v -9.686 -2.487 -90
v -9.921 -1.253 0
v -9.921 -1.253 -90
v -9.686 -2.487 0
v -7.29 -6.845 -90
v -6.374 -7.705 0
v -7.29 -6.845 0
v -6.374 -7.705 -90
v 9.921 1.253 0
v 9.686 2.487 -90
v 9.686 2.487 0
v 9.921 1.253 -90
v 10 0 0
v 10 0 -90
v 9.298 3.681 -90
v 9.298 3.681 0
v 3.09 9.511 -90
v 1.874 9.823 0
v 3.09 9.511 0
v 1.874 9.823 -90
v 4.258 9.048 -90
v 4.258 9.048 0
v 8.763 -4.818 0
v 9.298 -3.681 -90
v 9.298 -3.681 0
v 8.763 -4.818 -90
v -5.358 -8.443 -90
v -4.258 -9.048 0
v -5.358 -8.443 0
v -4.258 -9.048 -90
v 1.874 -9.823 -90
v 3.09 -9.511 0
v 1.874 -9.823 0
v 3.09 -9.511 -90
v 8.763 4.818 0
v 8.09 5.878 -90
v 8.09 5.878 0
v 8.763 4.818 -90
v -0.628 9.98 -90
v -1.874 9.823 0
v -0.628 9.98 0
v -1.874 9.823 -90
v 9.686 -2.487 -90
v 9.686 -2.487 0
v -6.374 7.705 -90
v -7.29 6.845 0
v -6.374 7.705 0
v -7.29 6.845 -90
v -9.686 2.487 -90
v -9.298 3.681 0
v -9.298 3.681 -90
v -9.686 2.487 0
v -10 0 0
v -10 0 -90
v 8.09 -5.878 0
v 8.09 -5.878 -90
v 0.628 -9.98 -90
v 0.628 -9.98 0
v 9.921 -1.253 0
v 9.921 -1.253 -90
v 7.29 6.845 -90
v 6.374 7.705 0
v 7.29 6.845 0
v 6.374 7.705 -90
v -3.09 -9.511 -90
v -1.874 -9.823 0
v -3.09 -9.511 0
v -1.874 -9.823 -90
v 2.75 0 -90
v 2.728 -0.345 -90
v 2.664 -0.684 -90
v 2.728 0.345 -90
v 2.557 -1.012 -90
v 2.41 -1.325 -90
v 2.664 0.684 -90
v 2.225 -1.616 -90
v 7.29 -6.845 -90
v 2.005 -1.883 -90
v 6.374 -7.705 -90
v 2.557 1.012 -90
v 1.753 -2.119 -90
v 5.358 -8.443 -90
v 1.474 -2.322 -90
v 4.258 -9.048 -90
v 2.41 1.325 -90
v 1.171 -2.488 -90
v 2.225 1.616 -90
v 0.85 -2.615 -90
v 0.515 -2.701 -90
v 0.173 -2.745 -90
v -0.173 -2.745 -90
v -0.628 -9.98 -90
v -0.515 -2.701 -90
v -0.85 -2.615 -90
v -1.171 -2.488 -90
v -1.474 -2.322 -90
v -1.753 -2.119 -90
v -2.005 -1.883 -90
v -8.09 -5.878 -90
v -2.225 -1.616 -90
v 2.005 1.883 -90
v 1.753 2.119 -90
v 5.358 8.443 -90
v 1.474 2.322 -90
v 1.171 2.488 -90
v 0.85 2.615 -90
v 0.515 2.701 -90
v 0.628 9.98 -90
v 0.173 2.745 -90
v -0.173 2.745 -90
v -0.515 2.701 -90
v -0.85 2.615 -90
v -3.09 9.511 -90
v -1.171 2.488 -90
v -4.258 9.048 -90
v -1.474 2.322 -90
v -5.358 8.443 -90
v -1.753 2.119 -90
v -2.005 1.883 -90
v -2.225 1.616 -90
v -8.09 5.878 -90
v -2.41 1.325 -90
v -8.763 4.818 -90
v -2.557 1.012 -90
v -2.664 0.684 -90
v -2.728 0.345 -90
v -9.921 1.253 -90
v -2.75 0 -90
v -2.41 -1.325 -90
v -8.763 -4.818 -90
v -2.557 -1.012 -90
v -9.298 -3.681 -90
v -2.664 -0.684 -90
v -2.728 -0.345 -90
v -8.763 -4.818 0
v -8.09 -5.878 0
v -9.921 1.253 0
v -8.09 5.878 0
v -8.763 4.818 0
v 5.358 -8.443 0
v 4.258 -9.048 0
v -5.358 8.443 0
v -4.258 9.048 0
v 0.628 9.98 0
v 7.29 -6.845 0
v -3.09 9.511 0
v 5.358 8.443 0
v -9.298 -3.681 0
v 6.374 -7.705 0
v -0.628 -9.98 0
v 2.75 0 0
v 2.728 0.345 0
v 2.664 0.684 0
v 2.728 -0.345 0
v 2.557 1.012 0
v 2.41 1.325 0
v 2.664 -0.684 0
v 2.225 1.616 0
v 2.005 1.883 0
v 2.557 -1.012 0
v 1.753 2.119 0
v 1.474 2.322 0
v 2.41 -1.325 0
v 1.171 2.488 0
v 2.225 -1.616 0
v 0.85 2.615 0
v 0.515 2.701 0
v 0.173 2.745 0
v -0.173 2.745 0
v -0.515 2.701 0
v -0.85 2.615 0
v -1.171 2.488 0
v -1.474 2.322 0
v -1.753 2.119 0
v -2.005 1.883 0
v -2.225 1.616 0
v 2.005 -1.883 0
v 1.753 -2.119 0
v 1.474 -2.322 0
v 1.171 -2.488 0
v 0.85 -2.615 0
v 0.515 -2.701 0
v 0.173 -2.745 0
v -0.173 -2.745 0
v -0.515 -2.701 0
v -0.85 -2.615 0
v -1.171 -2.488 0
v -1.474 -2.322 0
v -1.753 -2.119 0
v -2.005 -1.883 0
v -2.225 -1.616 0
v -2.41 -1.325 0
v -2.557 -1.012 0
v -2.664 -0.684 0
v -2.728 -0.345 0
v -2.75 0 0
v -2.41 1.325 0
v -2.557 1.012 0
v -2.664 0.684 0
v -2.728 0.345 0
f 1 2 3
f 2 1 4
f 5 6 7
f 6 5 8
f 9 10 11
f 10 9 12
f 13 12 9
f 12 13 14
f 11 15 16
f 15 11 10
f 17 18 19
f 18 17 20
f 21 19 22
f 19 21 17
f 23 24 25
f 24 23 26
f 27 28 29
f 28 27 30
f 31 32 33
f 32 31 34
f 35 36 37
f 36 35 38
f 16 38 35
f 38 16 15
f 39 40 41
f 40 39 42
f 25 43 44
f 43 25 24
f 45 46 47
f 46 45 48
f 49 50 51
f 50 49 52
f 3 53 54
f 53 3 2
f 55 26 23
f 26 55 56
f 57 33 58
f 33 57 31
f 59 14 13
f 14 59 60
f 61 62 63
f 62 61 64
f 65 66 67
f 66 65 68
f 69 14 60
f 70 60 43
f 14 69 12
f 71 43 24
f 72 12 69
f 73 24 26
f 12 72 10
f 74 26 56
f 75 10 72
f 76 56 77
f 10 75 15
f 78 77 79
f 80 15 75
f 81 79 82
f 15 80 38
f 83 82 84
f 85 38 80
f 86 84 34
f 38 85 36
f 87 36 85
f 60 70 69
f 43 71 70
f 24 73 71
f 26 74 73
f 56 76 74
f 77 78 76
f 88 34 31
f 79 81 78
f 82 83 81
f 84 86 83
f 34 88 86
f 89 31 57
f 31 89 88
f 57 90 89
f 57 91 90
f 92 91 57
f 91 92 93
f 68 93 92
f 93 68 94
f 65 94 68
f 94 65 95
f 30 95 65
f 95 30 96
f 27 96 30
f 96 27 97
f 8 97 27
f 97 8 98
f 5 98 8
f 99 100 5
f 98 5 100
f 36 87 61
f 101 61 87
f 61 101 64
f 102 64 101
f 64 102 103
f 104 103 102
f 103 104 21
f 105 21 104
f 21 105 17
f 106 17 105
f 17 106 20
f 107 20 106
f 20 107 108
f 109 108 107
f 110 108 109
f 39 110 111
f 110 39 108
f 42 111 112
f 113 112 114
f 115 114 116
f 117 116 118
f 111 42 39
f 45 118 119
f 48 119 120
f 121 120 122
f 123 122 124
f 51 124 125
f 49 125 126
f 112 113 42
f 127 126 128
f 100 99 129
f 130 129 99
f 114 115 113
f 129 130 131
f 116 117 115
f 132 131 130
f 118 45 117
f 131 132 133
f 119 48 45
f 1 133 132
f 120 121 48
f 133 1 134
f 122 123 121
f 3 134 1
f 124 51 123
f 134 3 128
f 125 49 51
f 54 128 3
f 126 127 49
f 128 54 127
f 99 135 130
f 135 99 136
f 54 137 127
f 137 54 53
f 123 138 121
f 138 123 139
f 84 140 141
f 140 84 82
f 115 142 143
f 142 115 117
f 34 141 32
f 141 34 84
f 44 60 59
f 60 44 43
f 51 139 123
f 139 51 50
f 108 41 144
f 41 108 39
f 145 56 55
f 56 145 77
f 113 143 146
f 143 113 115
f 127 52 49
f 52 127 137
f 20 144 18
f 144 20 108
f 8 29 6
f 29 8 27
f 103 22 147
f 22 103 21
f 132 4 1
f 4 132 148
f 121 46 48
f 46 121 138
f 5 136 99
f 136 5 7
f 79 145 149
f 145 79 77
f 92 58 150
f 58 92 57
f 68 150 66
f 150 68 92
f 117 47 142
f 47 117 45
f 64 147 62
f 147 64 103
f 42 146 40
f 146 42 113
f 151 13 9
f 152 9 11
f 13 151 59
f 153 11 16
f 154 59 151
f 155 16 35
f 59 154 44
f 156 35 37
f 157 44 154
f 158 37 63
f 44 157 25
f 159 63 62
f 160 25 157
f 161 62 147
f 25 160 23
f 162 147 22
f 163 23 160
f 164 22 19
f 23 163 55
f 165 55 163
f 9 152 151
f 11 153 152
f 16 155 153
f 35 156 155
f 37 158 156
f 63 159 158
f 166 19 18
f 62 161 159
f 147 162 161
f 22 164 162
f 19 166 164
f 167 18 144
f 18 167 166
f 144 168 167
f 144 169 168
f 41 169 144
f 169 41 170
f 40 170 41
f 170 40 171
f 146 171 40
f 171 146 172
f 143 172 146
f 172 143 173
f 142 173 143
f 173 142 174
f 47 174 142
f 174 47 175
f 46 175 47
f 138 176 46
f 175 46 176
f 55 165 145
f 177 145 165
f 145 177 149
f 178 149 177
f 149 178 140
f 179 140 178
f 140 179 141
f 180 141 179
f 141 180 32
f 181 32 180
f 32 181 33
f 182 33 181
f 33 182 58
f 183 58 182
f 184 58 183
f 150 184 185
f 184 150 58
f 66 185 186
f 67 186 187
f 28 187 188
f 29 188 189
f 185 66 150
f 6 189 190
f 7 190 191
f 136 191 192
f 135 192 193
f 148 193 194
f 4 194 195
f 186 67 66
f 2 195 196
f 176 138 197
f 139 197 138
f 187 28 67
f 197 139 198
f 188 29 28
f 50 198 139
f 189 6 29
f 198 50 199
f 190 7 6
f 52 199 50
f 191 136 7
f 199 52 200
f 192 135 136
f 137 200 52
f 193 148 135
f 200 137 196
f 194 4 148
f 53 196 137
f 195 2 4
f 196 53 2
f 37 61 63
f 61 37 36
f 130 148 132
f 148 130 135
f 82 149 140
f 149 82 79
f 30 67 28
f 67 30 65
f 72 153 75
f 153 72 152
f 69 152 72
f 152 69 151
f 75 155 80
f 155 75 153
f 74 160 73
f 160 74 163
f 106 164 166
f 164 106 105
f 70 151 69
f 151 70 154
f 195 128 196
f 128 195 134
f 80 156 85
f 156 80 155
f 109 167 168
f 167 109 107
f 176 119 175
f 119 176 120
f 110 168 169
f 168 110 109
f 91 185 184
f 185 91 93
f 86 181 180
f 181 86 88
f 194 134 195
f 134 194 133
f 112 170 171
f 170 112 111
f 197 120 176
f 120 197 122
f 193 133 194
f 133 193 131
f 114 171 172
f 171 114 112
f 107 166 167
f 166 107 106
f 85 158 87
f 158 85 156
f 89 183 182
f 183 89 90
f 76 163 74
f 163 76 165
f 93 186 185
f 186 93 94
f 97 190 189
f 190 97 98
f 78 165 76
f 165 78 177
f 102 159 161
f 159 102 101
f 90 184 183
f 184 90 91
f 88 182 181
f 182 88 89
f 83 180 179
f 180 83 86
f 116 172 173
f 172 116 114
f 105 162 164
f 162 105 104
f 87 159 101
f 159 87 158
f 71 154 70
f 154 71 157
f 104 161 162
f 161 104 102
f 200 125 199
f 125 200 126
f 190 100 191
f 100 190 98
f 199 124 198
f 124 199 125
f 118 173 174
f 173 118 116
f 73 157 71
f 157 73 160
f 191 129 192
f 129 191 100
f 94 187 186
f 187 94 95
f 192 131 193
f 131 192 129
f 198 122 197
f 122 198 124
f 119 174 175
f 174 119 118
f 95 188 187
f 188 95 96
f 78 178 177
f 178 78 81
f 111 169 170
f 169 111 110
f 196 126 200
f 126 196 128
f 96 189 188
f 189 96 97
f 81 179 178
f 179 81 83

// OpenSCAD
$fn = 50;


difference() {
	union() {
		translate(v = [0, 0, -90.0000000000]) {
			cylinder(h = 90, r = 10.0000000000);
		}
		cylinder(h = 0, r = 16.0000000000);
	}
	union() {
		#translate(v = [0, 0, -90]) {
			cylinder(h = 90, r = 2.7500000000);
		}
	}
}
